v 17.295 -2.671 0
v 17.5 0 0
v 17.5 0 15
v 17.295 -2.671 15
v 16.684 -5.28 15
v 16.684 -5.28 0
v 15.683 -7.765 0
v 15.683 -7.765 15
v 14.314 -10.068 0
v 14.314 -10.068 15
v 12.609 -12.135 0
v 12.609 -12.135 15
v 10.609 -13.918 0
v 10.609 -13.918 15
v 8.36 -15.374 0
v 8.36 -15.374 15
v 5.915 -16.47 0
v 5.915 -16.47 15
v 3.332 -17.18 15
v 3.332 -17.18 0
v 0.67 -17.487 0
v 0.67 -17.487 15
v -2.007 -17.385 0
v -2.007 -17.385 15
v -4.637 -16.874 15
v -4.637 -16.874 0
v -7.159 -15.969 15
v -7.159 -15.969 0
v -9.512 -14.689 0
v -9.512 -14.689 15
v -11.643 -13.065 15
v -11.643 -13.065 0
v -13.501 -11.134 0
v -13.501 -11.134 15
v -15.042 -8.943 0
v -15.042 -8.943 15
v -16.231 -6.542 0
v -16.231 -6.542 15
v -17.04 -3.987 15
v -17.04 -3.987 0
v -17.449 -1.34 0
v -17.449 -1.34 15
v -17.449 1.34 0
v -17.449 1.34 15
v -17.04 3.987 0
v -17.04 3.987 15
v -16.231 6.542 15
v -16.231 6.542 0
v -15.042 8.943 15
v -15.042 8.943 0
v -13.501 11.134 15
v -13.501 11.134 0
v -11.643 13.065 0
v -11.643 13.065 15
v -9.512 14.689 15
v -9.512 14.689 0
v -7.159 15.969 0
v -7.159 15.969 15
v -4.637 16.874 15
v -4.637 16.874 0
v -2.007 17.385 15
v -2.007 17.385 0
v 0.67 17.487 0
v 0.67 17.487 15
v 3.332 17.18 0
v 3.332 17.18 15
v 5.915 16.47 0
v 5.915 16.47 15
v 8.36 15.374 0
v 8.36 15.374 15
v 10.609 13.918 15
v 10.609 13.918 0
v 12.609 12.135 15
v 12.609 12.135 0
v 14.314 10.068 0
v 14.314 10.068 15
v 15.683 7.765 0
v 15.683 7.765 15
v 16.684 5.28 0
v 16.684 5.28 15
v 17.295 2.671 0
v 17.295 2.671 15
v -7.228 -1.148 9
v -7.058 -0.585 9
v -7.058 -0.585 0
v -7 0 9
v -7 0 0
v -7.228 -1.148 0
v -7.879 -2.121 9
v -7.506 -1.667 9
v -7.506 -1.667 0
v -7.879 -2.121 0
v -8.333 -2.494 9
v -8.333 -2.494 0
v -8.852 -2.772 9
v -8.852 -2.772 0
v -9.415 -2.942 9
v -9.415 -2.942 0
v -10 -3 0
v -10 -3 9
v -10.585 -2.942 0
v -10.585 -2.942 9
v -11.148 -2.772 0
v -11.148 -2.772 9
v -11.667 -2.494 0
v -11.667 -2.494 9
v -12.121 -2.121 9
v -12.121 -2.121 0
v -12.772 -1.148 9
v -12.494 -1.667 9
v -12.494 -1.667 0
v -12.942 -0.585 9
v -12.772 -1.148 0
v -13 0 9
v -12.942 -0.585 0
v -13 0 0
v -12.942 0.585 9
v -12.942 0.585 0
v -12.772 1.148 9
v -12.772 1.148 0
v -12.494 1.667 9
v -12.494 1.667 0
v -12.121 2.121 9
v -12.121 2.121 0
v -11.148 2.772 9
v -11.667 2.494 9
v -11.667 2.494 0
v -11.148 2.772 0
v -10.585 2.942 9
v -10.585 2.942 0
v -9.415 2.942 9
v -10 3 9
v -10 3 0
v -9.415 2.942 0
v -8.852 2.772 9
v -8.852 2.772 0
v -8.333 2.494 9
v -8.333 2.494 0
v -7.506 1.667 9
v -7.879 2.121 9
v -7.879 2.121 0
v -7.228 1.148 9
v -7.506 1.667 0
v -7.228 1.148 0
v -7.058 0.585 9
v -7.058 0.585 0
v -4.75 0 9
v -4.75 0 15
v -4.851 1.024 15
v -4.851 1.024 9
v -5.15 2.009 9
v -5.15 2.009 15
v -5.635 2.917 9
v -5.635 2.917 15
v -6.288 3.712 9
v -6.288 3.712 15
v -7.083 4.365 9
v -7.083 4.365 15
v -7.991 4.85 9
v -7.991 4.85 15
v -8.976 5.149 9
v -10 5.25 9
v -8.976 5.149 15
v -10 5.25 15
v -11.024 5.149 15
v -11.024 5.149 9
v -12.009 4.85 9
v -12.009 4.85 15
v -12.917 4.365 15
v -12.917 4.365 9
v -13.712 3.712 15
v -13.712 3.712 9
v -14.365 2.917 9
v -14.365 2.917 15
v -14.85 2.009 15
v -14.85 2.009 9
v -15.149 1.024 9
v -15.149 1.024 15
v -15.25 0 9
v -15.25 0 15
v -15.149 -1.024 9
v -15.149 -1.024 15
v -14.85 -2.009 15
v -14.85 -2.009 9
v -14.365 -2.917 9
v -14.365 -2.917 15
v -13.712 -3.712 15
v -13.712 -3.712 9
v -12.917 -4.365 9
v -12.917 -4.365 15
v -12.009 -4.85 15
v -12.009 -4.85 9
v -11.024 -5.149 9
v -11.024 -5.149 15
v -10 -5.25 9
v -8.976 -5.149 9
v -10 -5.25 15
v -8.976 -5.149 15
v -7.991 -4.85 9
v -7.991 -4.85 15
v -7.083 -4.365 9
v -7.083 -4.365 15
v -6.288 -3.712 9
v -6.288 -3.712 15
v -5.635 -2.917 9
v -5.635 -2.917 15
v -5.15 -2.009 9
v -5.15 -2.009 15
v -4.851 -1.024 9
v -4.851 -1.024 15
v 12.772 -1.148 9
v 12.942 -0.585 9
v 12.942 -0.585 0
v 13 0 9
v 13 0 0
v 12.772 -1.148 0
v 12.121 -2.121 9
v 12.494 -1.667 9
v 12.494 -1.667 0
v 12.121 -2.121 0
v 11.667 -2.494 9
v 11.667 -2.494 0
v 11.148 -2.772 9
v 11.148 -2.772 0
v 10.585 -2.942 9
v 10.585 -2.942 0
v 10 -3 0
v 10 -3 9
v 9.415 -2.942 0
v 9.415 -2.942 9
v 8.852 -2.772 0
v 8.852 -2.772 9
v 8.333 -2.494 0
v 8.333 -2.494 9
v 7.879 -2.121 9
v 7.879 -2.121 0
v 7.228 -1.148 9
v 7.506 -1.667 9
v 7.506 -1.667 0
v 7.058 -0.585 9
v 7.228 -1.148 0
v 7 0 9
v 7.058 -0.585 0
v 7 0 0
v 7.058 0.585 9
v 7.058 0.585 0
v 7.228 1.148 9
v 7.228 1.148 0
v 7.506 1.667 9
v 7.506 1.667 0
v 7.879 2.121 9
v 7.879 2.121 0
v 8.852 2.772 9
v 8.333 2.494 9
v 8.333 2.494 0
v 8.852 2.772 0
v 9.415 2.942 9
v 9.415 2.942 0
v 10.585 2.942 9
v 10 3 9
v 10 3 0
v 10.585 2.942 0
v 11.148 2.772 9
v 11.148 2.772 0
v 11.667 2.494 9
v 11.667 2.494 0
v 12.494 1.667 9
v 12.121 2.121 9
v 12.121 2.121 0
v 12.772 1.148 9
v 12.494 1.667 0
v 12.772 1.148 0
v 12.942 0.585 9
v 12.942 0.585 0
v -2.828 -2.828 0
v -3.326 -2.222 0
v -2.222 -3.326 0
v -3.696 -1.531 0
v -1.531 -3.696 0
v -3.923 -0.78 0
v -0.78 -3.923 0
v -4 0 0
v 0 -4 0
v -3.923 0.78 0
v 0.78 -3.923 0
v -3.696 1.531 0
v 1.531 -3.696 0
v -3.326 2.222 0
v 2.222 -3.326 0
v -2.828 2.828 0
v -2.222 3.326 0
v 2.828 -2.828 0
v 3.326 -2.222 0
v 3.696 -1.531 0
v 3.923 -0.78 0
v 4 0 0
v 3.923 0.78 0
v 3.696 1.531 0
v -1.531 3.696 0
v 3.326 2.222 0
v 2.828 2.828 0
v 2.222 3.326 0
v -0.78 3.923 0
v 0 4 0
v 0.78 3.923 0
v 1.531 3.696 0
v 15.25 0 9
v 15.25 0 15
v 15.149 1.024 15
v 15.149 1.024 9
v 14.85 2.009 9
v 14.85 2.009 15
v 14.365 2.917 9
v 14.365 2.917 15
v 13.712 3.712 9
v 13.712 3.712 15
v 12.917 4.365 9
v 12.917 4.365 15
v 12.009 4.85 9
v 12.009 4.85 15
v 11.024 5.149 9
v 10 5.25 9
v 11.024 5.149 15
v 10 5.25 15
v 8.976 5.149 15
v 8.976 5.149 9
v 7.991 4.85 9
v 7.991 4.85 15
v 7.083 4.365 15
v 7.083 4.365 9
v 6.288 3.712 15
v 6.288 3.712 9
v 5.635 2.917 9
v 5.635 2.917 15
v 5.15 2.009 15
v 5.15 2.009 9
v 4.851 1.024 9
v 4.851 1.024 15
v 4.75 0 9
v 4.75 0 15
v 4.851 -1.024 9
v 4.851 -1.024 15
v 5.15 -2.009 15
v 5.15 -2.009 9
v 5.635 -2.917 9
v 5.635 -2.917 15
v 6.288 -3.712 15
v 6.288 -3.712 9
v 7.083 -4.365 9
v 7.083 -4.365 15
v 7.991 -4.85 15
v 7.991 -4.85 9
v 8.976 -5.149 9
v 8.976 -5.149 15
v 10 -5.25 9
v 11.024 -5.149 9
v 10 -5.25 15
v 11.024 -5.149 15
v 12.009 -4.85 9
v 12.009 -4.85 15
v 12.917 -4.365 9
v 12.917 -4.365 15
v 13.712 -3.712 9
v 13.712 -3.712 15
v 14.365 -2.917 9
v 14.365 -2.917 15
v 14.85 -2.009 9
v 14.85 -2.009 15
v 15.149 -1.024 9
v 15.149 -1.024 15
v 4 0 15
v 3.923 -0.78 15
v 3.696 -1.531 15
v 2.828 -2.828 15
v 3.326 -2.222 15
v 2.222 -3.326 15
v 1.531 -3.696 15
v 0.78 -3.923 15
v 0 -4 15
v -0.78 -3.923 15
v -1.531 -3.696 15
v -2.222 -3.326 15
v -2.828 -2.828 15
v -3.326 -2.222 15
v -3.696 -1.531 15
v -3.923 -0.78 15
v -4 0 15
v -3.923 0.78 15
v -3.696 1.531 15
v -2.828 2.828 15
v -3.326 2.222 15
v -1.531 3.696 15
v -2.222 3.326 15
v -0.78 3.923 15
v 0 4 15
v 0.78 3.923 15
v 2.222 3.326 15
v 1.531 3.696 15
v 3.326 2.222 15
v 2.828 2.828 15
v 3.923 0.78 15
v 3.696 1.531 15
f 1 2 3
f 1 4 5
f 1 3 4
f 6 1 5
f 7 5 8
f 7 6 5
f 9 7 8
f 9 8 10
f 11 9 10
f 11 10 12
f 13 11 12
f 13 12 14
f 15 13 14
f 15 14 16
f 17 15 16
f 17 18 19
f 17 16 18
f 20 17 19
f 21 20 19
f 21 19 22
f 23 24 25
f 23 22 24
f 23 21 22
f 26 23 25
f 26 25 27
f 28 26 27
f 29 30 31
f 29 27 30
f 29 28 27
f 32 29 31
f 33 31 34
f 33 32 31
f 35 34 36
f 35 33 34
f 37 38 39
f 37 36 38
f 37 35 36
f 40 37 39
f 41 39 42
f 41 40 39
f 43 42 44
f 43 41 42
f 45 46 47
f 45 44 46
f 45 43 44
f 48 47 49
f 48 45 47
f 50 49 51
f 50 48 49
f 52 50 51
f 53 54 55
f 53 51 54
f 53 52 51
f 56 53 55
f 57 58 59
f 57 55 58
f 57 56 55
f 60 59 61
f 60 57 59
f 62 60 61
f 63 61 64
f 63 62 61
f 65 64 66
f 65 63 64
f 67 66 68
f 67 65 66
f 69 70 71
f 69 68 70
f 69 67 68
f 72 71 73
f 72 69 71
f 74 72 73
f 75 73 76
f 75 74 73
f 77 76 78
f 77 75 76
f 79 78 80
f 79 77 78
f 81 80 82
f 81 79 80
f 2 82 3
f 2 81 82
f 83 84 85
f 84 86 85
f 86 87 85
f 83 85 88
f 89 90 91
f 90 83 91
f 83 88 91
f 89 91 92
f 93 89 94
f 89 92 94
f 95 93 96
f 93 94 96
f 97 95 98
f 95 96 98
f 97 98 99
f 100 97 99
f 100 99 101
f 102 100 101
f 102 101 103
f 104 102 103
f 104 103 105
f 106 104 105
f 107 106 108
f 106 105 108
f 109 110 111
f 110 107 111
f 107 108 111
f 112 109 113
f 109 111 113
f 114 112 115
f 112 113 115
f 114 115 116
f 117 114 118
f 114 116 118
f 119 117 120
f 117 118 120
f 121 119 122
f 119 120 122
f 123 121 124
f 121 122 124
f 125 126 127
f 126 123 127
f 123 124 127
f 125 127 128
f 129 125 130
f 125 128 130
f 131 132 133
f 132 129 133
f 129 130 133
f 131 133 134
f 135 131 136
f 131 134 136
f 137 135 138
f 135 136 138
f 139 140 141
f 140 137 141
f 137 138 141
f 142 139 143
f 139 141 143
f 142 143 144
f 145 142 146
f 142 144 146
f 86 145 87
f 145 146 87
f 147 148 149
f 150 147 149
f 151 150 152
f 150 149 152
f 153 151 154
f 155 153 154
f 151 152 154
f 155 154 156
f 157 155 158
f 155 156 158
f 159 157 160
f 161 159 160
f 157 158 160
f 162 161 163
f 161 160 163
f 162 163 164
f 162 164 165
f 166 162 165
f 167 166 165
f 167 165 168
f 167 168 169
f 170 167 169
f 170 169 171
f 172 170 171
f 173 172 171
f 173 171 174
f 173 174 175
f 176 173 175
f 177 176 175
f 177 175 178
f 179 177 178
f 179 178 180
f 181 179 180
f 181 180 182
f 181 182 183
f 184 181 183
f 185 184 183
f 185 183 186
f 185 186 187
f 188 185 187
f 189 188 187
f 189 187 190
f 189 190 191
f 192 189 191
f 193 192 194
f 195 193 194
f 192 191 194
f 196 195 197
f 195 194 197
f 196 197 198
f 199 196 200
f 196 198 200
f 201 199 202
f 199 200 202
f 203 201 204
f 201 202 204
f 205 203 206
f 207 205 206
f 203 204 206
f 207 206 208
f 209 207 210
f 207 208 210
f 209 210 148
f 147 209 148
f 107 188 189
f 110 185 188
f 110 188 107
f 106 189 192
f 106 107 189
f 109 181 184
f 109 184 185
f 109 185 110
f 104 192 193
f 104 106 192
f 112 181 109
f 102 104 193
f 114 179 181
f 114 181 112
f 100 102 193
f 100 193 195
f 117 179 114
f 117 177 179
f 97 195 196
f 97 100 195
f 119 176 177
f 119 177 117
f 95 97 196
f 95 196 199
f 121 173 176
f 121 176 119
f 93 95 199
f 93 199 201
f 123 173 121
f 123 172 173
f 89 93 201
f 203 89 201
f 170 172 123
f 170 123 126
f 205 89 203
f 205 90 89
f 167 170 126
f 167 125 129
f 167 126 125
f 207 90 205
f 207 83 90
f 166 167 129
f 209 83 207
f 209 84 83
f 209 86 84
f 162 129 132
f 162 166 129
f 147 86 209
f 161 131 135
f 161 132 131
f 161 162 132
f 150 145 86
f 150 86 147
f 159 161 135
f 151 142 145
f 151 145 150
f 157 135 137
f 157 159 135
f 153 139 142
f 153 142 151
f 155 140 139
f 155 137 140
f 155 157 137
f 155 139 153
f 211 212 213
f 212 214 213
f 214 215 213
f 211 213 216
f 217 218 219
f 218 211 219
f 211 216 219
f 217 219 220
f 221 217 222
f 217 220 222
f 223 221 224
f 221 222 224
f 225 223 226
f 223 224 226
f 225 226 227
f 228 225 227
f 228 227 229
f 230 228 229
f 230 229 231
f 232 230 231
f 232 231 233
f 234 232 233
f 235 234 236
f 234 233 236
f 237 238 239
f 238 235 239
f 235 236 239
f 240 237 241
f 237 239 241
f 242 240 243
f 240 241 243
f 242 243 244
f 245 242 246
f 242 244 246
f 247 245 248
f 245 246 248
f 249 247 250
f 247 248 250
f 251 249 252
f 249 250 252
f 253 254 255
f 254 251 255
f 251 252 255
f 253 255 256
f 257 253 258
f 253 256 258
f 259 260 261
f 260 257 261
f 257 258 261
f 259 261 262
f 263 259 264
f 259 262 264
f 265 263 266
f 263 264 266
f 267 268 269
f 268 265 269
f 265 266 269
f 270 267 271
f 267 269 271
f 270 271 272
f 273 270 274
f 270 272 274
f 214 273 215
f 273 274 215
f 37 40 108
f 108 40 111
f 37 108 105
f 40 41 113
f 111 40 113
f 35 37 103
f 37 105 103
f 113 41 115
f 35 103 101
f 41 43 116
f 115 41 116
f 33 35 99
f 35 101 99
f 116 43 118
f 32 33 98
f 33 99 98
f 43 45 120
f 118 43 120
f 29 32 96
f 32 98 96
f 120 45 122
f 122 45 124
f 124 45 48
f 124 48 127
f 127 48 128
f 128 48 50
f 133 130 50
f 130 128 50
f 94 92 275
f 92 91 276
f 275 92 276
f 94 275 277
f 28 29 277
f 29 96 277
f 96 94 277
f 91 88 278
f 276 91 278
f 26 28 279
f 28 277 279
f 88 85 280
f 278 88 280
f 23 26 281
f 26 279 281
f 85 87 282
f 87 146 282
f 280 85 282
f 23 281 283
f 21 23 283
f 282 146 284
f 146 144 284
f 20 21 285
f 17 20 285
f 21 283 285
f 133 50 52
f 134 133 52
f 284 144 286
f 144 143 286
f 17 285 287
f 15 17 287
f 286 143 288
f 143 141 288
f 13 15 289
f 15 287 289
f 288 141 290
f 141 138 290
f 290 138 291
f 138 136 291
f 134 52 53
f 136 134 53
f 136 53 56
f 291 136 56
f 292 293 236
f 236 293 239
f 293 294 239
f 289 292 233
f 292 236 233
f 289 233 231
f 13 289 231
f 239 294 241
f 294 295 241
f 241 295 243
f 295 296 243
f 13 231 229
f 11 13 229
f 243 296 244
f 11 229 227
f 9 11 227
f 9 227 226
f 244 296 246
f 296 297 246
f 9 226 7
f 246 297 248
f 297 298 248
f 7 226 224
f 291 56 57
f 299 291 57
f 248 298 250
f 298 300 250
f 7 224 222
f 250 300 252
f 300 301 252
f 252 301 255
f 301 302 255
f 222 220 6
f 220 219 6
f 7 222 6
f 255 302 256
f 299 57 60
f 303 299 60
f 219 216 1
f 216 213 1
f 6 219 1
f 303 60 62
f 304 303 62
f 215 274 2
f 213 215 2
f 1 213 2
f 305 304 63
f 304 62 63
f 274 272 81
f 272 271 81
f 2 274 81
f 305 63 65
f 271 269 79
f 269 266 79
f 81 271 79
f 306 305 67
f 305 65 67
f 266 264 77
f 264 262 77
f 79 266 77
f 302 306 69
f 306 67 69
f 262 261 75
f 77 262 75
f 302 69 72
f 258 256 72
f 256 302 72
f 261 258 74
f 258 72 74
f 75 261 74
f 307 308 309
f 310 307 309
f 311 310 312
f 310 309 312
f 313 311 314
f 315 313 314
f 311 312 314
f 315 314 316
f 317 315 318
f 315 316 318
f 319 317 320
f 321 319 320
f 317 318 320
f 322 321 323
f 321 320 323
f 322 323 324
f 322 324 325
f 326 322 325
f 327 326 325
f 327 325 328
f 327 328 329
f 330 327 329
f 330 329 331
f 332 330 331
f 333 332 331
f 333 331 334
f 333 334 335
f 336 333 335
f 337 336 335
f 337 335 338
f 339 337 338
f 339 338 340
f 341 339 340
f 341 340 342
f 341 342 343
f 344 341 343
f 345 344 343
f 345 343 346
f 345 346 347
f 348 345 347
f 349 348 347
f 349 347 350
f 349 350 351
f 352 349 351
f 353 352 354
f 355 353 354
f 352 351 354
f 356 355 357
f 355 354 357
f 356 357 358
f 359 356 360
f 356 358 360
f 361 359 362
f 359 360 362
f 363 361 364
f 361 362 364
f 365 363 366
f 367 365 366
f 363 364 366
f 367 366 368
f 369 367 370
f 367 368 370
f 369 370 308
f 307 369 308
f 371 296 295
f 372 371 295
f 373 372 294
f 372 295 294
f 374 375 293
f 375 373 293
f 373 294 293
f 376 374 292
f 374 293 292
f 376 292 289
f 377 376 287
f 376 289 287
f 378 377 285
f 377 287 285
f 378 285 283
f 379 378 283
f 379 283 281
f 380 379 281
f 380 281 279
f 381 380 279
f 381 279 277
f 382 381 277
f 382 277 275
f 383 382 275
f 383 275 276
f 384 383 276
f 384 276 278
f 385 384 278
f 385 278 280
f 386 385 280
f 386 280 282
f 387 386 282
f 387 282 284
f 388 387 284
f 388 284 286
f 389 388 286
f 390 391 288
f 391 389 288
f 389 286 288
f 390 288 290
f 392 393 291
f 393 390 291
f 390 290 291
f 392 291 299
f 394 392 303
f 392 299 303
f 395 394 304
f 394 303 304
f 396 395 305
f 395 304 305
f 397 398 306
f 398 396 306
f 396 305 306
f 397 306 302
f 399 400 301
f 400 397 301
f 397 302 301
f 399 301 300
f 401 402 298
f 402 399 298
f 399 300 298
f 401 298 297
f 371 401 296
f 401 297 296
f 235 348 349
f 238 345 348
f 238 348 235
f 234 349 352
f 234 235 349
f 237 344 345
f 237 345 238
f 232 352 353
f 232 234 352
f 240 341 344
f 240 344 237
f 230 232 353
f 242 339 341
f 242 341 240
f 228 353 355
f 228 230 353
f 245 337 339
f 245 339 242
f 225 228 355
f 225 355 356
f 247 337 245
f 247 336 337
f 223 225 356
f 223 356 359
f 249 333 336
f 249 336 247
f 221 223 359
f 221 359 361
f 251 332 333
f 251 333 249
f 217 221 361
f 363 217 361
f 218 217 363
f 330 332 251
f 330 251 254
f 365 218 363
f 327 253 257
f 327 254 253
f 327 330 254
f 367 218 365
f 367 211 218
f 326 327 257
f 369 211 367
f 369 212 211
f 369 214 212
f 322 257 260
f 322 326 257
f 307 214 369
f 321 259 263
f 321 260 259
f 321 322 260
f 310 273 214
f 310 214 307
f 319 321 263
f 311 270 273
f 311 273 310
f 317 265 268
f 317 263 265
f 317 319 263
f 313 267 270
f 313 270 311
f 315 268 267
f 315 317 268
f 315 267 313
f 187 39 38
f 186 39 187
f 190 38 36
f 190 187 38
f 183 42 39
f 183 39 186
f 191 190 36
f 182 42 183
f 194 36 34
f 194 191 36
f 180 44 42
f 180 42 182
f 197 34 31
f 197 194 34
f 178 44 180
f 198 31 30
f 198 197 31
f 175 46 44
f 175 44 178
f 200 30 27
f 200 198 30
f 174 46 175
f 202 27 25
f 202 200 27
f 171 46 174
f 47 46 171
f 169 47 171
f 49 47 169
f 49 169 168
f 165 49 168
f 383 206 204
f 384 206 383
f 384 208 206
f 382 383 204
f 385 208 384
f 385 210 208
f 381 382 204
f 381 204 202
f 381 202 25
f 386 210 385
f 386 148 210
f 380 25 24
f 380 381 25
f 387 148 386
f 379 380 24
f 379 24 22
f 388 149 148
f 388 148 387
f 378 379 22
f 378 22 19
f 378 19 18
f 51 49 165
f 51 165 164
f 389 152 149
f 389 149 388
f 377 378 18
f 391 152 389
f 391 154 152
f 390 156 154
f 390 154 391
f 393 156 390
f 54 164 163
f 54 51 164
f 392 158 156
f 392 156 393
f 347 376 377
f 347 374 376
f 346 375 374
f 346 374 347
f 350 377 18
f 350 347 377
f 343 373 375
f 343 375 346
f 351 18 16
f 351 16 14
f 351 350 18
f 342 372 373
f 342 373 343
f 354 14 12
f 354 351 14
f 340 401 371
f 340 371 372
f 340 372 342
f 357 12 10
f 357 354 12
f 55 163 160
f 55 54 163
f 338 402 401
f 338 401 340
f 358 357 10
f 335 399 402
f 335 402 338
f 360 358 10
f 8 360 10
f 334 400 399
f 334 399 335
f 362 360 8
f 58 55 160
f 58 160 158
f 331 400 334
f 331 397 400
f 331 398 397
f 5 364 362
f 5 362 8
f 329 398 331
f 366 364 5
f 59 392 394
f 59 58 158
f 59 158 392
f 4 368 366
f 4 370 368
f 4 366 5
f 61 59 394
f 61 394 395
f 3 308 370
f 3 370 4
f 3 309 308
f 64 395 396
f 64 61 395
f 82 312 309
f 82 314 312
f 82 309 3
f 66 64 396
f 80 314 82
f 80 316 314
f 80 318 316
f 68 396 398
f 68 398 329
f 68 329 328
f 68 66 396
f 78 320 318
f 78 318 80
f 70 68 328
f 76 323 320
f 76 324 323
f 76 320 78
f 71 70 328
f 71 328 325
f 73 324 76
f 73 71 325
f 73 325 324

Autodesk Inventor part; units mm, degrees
ref_plane "YZ Plane" through (0, 0, 0) normal (1, 0, 0) x (0, 1, 0)
ref_plane "XZ Plane" through (0, 0, 0) normal (0, 1, 0) x (-1, 0, 0)
ref_plane "XY Plane" through (0, 0, 0) normal (0, 0, 1) x (1, 0, 0)
sketch "Sketch1" plane through (0, 0, 0) normal (0, 0, 1) x (1, 0, 0)
  circle A0 centre (0, 0) radius 17.5
  circle A1 centre (0, 0) radius 4
  line L0 (-10, 0) -> (10, 0) construction
  circle A2 centre (-10, 0) radius 3
  circle A3 centre (10, 0) radius 3
  dimension "d0" = 35
  dimension "d1" = 8
  dimension "d7" = 20
  dimension "d8" = 6
extrude "Extrusion1" add sketch "Sketch1" along normal blind 15
sketch "Sketch3" plane through (0, 0, 15) normal (0, 0, 1) x (1, 0, 0)
  circle A0 centre (10, 0) radius 3 projected
  circle A1 centre (-10, 0) radius 3 projected
  circle A2 centre (-10, 0) radius 5.25
  circle A3 centre (10, 0) radius 5.25
  dimension "d9" = 10.5
extrude "Extrusion3" cut sketch "Sketch3" against normal blind 6
properties part number "gear thrust cup"
